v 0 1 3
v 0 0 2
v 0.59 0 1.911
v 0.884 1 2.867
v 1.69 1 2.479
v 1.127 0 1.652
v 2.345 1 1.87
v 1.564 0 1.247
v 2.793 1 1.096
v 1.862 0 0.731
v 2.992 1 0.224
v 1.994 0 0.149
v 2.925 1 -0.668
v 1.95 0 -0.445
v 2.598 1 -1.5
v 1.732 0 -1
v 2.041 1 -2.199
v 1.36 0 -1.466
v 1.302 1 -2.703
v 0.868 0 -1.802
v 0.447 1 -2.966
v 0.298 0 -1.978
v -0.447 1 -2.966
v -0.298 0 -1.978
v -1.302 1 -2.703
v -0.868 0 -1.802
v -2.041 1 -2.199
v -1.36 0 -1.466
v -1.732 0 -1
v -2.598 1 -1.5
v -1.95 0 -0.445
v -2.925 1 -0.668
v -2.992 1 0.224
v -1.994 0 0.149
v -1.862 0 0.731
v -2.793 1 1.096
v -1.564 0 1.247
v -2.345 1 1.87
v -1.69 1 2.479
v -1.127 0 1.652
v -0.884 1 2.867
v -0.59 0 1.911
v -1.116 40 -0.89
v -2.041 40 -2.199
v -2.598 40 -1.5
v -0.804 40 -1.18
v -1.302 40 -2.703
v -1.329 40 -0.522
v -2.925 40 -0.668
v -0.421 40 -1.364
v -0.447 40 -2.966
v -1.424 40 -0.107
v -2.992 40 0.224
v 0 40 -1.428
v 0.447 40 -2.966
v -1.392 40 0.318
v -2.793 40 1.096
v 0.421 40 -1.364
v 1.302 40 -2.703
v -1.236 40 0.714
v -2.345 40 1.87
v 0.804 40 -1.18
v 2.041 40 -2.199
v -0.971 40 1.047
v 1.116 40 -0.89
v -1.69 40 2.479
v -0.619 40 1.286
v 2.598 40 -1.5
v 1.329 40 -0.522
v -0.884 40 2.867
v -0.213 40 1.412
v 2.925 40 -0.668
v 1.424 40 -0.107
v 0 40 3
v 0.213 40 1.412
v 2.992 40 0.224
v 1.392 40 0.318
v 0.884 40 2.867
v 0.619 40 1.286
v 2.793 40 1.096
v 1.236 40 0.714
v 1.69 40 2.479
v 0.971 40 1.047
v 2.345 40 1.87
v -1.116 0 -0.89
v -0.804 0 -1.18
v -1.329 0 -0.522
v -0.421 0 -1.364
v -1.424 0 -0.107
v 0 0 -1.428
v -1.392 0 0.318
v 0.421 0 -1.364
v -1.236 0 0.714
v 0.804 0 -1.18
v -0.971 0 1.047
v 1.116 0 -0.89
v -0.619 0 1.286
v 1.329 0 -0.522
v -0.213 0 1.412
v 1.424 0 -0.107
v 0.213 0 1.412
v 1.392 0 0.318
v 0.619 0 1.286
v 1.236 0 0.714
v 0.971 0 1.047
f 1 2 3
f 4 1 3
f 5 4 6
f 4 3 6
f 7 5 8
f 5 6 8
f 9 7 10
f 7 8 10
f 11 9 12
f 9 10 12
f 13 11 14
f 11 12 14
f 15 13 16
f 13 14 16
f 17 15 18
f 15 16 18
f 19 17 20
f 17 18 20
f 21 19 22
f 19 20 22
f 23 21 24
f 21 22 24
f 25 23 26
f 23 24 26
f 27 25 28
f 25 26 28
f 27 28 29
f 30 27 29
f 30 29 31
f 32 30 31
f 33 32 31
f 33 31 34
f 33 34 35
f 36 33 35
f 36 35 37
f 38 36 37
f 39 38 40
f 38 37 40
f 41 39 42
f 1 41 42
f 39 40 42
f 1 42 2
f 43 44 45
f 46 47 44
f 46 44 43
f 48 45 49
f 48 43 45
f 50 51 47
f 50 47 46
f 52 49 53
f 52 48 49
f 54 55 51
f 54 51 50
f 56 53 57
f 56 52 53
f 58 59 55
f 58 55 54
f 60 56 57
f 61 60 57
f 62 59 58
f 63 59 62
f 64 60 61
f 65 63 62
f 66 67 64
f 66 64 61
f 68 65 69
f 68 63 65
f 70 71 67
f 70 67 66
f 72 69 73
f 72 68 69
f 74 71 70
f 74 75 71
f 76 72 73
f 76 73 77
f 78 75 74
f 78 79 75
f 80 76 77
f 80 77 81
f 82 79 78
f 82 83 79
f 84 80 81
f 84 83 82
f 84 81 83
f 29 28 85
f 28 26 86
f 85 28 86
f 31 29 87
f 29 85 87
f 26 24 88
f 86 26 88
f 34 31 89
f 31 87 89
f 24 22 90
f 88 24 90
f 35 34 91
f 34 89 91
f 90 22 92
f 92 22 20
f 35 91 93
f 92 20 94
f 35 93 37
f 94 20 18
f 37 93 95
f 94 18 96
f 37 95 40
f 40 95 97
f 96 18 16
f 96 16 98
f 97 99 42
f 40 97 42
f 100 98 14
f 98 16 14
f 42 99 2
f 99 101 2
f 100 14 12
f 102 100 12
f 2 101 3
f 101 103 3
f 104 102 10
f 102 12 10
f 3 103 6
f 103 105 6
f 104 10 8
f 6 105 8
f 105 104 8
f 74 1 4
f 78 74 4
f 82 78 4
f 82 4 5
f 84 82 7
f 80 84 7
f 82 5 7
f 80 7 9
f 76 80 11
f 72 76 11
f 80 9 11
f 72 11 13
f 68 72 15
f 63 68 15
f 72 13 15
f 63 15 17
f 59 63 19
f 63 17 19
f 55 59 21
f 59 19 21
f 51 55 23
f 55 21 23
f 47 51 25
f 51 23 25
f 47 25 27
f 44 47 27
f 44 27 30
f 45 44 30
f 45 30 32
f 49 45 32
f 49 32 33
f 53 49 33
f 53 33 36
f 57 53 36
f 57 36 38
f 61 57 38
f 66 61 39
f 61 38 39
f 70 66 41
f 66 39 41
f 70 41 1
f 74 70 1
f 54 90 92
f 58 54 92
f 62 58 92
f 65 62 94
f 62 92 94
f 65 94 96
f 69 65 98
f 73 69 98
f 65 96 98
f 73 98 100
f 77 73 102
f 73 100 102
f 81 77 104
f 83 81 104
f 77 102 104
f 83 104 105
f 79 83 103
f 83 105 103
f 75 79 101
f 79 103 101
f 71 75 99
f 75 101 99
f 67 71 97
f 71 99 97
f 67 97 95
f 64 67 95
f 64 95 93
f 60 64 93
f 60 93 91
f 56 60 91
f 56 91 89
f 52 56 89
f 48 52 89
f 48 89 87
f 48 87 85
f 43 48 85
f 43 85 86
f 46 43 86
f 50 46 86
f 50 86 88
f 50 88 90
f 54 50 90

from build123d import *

# Parameters (mm, degrees)
SKETCH_1_R          = 3
EXTRUDE_1_DEPTH     = 40
SKETCH_2_R          = 1.427663882
CUT_EXTRUDE_1_DEPTH = 41.224370722
CHAMFER_1_SIZE      = 1


with BuildPart() as part:
    # 草图1 → 凸台-拉伸1 (new body)
    with BuildSketch(Plane(origin=(0, 0, 0), x_dir=(1, 0, 0), z_dir=(0, 1, 0))):
        with Locations(Location((0, 0, 0), (0, 0, 270))):
            Circle(SKETCH_1_R)
    extrude(amount=EXTRUDE_1_DEPTH)

    # 草图2 → 切除-拉伸1 (cut, through all)
    with BuildSketch(Plane.XZ):
        with Locations(Location((0, 0, 0), (0, 0, 270))):
            Circle(SKETCH_2_R)
    extrude(amount=-CUT_EXTRUDE_1_DEPTH, mode=Mode.SUBTRACT)

    # 倒角1
    chamfer_1_edges = [part.edges().sort_by_distance(p)[0] for p in [
        (0, 0, -3),
    ]]
    chamfer(chamfer_1_edges, length=CHAMFER_1_SIZE)


solid = part.part
